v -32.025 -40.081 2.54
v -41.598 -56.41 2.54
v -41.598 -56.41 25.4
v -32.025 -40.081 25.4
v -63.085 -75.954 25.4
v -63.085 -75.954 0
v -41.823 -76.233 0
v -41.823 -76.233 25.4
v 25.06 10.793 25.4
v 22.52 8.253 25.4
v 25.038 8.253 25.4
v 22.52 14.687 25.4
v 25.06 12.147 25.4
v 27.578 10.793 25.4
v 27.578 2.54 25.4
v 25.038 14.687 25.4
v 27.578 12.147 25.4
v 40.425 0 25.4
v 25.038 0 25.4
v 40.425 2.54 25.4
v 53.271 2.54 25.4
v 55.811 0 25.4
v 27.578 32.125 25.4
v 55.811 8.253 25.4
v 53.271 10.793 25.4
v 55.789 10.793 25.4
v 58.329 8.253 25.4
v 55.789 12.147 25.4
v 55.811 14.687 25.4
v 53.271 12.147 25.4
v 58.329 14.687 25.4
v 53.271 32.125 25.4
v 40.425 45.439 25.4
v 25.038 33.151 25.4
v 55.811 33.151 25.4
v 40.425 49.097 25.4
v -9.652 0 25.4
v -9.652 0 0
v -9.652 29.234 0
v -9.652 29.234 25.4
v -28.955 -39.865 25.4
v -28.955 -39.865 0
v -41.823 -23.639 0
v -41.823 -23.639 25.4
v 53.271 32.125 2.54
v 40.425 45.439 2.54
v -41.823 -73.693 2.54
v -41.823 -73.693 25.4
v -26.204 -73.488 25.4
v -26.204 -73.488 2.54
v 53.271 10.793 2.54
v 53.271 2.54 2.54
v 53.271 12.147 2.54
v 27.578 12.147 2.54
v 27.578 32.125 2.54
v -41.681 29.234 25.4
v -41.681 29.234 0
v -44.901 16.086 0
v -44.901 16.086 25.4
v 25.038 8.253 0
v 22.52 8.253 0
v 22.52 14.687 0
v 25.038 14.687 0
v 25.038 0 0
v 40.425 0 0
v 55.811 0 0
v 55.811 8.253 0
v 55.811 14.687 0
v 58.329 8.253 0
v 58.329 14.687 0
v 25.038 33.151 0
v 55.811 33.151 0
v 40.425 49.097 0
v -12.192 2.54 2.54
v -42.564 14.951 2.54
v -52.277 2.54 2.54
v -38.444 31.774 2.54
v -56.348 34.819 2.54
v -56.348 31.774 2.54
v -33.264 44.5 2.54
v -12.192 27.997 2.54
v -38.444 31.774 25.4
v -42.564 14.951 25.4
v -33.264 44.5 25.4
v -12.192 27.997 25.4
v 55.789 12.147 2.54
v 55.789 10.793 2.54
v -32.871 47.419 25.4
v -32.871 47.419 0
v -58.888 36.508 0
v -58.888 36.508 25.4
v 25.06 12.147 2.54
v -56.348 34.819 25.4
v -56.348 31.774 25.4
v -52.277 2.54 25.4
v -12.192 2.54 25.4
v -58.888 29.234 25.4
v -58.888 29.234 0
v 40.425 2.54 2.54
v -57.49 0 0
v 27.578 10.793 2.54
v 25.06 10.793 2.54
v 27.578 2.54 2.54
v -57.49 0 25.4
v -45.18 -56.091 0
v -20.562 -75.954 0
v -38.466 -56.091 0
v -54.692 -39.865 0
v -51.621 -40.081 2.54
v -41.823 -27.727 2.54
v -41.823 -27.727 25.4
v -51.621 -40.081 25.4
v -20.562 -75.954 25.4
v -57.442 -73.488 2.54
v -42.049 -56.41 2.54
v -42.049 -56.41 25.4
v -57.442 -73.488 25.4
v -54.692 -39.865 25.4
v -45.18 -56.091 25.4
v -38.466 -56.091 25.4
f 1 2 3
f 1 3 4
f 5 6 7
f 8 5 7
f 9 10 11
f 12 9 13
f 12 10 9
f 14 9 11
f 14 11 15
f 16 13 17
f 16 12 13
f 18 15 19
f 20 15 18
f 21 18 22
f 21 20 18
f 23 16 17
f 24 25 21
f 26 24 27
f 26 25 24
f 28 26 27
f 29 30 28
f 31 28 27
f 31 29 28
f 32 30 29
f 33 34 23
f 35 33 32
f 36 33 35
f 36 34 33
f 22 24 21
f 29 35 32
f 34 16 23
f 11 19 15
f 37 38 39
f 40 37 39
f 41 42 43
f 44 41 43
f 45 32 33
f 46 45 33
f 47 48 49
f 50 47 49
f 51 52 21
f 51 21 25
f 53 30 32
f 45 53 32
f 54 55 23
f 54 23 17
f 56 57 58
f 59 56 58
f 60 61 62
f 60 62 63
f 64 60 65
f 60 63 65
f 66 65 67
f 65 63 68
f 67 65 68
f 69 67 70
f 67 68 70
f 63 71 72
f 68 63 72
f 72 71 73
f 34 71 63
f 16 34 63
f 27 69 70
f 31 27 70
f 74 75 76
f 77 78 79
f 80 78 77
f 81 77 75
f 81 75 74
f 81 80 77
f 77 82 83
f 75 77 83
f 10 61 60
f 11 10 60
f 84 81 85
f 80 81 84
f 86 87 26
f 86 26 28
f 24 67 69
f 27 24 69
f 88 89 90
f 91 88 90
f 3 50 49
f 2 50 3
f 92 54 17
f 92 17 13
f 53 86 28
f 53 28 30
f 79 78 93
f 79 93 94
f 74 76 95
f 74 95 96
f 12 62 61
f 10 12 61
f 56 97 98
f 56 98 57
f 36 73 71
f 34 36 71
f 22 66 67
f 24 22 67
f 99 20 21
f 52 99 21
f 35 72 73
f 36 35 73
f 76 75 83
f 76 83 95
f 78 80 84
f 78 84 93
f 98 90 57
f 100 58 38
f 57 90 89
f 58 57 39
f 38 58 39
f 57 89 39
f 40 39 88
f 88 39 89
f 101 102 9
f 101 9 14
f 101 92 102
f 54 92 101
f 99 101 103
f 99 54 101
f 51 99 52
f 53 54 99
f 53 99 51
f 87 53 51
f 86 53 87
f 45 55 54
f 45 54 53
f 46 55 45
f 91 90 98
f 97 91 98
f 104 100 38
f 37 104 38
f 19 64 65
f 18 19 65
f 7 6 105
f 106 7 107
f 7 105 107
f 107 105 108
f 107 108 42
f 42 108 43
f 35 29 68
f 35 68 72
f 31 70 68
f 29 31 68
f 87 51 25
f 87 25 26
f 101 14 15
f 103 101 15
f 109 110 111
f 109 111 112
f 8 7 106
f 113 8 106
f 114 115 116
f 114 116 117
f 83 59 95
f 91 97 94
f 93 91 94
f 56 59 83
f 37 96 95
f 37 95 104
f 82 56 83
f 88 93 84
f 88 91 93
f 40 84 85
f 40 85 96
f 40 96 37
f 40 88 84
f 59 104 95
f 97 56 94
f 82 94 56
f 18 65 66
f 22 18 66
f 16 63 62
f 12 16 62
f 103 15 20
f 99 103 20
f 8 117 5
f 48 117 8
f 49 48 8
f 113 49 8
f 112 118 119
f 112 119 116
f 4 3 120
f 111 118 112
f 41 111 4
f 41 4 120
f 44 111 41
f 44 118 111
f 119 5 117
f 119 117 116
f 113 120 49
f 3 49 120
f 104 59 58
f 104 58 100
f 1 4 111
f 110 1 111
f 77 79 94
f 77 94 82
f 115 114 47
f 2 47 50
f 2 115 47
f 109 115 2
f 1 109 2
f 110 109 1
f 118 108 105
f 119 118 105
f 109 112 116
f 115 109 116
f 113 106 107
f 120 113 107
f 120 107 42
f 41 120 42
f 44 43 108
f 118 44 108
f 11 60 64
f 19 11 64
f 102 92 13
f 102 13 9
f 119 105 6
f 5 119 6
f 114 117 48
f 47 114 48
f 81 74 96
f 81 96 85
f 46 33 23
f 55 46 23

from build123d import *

# Parameters (mm, degrees)
F1_DEPTH = 25.4
F2_T     = -2.54
F4_DEPTH = 25.4
F5_T     = -2.54
F7_DEPTH = 25.4
F8_T     = -2.54


with BuildPart() as f1:
    # F0 (on Top) → F1 (new body)
    with BuildSketch(Plane.XY):
        Polygon((-44.9007153511, 16.0859264433), (-57.4897043407, 0), (-9.6515547484, 0), (-9.6515547484, 29.2344223708), (-32.8712426126, 47.418512404), (-58.8884800673, 36.5080609918), (-58.8884800673, 29.2344223708), (-41.6806784491, 29.2344223708), align=None)
    extrude(amount=F1_DEPTH)

    # F2
    f2_openings = [f1.faces().sort_by_distance(p)[0] for p in [
        (-31.482072, 20.842376, 25.4),
    ]]
    offset(amount=F2_T, openings=f2_openings, kind=Kind.INTERSECTION)


with BuildPart() as f4:
    # F3 (on Top) → F4 (new body)
    with BuildSketch(Plane.XY):
        Polygon((40.4246318837, 0), (55.8111704638, 0), (55.8111704638, 8.2527799532), (58.3289637913, 8.2527799532), (58.3289637913, 14.6871507168), (55.8111704638, 14.6871507168), (55.8111704638, 33.1509970129), (40.4246337463, 49.0970462561), (25.0380958438, 33.1509981803), (25.0380944429, 14.6871518843), (22.5203011153, 14.6871520753), (22.5203006271, 8.2527813117), (25.0380939547, 8.2527811207), (25.0380933285, 1.1675e-06), align=None)
    extrude(amount=F4_DEPTH)

    # F5
    f5_openings = [f4.faces().sort_by_distance(p)[0] for p in [
        (40.424633, 20.586239, 25.4),
    ]]
    offset(amount=F5_T, openings=f5_openings, kind=Kind.INTERSECTION)


with BuildPart() as f7:
    # F6 (on Top) → F7 (new body)
    with BuildSketch(Plane.XY):
        Polygon((-41.8234094977, -23.6393176019), (-54.6921510249, -39.8651212454), (-45.1804734766, -56.0909286141), (-63.0848109722, -75.9535506368), (-41.8234094977, -76.233305037), (-20.5620080233, -75.9535506368), (-38.4663455188, -56.0909286141), (-28.9546679705, -39.8651212454), align=None)
    extrude(amount=F7_DEPTH)

    # F8
    f8_openings = [f7.faces().sort_by_distance(p)[0] for p in [
        (-41.823409, -55.141172, 25.4),
    ]]
    offset(amount=F8_T, openings=f8_openings, kind=Kind.INTERSECTION)


solid = Compound([f1.part, f4.part, f7.part])
